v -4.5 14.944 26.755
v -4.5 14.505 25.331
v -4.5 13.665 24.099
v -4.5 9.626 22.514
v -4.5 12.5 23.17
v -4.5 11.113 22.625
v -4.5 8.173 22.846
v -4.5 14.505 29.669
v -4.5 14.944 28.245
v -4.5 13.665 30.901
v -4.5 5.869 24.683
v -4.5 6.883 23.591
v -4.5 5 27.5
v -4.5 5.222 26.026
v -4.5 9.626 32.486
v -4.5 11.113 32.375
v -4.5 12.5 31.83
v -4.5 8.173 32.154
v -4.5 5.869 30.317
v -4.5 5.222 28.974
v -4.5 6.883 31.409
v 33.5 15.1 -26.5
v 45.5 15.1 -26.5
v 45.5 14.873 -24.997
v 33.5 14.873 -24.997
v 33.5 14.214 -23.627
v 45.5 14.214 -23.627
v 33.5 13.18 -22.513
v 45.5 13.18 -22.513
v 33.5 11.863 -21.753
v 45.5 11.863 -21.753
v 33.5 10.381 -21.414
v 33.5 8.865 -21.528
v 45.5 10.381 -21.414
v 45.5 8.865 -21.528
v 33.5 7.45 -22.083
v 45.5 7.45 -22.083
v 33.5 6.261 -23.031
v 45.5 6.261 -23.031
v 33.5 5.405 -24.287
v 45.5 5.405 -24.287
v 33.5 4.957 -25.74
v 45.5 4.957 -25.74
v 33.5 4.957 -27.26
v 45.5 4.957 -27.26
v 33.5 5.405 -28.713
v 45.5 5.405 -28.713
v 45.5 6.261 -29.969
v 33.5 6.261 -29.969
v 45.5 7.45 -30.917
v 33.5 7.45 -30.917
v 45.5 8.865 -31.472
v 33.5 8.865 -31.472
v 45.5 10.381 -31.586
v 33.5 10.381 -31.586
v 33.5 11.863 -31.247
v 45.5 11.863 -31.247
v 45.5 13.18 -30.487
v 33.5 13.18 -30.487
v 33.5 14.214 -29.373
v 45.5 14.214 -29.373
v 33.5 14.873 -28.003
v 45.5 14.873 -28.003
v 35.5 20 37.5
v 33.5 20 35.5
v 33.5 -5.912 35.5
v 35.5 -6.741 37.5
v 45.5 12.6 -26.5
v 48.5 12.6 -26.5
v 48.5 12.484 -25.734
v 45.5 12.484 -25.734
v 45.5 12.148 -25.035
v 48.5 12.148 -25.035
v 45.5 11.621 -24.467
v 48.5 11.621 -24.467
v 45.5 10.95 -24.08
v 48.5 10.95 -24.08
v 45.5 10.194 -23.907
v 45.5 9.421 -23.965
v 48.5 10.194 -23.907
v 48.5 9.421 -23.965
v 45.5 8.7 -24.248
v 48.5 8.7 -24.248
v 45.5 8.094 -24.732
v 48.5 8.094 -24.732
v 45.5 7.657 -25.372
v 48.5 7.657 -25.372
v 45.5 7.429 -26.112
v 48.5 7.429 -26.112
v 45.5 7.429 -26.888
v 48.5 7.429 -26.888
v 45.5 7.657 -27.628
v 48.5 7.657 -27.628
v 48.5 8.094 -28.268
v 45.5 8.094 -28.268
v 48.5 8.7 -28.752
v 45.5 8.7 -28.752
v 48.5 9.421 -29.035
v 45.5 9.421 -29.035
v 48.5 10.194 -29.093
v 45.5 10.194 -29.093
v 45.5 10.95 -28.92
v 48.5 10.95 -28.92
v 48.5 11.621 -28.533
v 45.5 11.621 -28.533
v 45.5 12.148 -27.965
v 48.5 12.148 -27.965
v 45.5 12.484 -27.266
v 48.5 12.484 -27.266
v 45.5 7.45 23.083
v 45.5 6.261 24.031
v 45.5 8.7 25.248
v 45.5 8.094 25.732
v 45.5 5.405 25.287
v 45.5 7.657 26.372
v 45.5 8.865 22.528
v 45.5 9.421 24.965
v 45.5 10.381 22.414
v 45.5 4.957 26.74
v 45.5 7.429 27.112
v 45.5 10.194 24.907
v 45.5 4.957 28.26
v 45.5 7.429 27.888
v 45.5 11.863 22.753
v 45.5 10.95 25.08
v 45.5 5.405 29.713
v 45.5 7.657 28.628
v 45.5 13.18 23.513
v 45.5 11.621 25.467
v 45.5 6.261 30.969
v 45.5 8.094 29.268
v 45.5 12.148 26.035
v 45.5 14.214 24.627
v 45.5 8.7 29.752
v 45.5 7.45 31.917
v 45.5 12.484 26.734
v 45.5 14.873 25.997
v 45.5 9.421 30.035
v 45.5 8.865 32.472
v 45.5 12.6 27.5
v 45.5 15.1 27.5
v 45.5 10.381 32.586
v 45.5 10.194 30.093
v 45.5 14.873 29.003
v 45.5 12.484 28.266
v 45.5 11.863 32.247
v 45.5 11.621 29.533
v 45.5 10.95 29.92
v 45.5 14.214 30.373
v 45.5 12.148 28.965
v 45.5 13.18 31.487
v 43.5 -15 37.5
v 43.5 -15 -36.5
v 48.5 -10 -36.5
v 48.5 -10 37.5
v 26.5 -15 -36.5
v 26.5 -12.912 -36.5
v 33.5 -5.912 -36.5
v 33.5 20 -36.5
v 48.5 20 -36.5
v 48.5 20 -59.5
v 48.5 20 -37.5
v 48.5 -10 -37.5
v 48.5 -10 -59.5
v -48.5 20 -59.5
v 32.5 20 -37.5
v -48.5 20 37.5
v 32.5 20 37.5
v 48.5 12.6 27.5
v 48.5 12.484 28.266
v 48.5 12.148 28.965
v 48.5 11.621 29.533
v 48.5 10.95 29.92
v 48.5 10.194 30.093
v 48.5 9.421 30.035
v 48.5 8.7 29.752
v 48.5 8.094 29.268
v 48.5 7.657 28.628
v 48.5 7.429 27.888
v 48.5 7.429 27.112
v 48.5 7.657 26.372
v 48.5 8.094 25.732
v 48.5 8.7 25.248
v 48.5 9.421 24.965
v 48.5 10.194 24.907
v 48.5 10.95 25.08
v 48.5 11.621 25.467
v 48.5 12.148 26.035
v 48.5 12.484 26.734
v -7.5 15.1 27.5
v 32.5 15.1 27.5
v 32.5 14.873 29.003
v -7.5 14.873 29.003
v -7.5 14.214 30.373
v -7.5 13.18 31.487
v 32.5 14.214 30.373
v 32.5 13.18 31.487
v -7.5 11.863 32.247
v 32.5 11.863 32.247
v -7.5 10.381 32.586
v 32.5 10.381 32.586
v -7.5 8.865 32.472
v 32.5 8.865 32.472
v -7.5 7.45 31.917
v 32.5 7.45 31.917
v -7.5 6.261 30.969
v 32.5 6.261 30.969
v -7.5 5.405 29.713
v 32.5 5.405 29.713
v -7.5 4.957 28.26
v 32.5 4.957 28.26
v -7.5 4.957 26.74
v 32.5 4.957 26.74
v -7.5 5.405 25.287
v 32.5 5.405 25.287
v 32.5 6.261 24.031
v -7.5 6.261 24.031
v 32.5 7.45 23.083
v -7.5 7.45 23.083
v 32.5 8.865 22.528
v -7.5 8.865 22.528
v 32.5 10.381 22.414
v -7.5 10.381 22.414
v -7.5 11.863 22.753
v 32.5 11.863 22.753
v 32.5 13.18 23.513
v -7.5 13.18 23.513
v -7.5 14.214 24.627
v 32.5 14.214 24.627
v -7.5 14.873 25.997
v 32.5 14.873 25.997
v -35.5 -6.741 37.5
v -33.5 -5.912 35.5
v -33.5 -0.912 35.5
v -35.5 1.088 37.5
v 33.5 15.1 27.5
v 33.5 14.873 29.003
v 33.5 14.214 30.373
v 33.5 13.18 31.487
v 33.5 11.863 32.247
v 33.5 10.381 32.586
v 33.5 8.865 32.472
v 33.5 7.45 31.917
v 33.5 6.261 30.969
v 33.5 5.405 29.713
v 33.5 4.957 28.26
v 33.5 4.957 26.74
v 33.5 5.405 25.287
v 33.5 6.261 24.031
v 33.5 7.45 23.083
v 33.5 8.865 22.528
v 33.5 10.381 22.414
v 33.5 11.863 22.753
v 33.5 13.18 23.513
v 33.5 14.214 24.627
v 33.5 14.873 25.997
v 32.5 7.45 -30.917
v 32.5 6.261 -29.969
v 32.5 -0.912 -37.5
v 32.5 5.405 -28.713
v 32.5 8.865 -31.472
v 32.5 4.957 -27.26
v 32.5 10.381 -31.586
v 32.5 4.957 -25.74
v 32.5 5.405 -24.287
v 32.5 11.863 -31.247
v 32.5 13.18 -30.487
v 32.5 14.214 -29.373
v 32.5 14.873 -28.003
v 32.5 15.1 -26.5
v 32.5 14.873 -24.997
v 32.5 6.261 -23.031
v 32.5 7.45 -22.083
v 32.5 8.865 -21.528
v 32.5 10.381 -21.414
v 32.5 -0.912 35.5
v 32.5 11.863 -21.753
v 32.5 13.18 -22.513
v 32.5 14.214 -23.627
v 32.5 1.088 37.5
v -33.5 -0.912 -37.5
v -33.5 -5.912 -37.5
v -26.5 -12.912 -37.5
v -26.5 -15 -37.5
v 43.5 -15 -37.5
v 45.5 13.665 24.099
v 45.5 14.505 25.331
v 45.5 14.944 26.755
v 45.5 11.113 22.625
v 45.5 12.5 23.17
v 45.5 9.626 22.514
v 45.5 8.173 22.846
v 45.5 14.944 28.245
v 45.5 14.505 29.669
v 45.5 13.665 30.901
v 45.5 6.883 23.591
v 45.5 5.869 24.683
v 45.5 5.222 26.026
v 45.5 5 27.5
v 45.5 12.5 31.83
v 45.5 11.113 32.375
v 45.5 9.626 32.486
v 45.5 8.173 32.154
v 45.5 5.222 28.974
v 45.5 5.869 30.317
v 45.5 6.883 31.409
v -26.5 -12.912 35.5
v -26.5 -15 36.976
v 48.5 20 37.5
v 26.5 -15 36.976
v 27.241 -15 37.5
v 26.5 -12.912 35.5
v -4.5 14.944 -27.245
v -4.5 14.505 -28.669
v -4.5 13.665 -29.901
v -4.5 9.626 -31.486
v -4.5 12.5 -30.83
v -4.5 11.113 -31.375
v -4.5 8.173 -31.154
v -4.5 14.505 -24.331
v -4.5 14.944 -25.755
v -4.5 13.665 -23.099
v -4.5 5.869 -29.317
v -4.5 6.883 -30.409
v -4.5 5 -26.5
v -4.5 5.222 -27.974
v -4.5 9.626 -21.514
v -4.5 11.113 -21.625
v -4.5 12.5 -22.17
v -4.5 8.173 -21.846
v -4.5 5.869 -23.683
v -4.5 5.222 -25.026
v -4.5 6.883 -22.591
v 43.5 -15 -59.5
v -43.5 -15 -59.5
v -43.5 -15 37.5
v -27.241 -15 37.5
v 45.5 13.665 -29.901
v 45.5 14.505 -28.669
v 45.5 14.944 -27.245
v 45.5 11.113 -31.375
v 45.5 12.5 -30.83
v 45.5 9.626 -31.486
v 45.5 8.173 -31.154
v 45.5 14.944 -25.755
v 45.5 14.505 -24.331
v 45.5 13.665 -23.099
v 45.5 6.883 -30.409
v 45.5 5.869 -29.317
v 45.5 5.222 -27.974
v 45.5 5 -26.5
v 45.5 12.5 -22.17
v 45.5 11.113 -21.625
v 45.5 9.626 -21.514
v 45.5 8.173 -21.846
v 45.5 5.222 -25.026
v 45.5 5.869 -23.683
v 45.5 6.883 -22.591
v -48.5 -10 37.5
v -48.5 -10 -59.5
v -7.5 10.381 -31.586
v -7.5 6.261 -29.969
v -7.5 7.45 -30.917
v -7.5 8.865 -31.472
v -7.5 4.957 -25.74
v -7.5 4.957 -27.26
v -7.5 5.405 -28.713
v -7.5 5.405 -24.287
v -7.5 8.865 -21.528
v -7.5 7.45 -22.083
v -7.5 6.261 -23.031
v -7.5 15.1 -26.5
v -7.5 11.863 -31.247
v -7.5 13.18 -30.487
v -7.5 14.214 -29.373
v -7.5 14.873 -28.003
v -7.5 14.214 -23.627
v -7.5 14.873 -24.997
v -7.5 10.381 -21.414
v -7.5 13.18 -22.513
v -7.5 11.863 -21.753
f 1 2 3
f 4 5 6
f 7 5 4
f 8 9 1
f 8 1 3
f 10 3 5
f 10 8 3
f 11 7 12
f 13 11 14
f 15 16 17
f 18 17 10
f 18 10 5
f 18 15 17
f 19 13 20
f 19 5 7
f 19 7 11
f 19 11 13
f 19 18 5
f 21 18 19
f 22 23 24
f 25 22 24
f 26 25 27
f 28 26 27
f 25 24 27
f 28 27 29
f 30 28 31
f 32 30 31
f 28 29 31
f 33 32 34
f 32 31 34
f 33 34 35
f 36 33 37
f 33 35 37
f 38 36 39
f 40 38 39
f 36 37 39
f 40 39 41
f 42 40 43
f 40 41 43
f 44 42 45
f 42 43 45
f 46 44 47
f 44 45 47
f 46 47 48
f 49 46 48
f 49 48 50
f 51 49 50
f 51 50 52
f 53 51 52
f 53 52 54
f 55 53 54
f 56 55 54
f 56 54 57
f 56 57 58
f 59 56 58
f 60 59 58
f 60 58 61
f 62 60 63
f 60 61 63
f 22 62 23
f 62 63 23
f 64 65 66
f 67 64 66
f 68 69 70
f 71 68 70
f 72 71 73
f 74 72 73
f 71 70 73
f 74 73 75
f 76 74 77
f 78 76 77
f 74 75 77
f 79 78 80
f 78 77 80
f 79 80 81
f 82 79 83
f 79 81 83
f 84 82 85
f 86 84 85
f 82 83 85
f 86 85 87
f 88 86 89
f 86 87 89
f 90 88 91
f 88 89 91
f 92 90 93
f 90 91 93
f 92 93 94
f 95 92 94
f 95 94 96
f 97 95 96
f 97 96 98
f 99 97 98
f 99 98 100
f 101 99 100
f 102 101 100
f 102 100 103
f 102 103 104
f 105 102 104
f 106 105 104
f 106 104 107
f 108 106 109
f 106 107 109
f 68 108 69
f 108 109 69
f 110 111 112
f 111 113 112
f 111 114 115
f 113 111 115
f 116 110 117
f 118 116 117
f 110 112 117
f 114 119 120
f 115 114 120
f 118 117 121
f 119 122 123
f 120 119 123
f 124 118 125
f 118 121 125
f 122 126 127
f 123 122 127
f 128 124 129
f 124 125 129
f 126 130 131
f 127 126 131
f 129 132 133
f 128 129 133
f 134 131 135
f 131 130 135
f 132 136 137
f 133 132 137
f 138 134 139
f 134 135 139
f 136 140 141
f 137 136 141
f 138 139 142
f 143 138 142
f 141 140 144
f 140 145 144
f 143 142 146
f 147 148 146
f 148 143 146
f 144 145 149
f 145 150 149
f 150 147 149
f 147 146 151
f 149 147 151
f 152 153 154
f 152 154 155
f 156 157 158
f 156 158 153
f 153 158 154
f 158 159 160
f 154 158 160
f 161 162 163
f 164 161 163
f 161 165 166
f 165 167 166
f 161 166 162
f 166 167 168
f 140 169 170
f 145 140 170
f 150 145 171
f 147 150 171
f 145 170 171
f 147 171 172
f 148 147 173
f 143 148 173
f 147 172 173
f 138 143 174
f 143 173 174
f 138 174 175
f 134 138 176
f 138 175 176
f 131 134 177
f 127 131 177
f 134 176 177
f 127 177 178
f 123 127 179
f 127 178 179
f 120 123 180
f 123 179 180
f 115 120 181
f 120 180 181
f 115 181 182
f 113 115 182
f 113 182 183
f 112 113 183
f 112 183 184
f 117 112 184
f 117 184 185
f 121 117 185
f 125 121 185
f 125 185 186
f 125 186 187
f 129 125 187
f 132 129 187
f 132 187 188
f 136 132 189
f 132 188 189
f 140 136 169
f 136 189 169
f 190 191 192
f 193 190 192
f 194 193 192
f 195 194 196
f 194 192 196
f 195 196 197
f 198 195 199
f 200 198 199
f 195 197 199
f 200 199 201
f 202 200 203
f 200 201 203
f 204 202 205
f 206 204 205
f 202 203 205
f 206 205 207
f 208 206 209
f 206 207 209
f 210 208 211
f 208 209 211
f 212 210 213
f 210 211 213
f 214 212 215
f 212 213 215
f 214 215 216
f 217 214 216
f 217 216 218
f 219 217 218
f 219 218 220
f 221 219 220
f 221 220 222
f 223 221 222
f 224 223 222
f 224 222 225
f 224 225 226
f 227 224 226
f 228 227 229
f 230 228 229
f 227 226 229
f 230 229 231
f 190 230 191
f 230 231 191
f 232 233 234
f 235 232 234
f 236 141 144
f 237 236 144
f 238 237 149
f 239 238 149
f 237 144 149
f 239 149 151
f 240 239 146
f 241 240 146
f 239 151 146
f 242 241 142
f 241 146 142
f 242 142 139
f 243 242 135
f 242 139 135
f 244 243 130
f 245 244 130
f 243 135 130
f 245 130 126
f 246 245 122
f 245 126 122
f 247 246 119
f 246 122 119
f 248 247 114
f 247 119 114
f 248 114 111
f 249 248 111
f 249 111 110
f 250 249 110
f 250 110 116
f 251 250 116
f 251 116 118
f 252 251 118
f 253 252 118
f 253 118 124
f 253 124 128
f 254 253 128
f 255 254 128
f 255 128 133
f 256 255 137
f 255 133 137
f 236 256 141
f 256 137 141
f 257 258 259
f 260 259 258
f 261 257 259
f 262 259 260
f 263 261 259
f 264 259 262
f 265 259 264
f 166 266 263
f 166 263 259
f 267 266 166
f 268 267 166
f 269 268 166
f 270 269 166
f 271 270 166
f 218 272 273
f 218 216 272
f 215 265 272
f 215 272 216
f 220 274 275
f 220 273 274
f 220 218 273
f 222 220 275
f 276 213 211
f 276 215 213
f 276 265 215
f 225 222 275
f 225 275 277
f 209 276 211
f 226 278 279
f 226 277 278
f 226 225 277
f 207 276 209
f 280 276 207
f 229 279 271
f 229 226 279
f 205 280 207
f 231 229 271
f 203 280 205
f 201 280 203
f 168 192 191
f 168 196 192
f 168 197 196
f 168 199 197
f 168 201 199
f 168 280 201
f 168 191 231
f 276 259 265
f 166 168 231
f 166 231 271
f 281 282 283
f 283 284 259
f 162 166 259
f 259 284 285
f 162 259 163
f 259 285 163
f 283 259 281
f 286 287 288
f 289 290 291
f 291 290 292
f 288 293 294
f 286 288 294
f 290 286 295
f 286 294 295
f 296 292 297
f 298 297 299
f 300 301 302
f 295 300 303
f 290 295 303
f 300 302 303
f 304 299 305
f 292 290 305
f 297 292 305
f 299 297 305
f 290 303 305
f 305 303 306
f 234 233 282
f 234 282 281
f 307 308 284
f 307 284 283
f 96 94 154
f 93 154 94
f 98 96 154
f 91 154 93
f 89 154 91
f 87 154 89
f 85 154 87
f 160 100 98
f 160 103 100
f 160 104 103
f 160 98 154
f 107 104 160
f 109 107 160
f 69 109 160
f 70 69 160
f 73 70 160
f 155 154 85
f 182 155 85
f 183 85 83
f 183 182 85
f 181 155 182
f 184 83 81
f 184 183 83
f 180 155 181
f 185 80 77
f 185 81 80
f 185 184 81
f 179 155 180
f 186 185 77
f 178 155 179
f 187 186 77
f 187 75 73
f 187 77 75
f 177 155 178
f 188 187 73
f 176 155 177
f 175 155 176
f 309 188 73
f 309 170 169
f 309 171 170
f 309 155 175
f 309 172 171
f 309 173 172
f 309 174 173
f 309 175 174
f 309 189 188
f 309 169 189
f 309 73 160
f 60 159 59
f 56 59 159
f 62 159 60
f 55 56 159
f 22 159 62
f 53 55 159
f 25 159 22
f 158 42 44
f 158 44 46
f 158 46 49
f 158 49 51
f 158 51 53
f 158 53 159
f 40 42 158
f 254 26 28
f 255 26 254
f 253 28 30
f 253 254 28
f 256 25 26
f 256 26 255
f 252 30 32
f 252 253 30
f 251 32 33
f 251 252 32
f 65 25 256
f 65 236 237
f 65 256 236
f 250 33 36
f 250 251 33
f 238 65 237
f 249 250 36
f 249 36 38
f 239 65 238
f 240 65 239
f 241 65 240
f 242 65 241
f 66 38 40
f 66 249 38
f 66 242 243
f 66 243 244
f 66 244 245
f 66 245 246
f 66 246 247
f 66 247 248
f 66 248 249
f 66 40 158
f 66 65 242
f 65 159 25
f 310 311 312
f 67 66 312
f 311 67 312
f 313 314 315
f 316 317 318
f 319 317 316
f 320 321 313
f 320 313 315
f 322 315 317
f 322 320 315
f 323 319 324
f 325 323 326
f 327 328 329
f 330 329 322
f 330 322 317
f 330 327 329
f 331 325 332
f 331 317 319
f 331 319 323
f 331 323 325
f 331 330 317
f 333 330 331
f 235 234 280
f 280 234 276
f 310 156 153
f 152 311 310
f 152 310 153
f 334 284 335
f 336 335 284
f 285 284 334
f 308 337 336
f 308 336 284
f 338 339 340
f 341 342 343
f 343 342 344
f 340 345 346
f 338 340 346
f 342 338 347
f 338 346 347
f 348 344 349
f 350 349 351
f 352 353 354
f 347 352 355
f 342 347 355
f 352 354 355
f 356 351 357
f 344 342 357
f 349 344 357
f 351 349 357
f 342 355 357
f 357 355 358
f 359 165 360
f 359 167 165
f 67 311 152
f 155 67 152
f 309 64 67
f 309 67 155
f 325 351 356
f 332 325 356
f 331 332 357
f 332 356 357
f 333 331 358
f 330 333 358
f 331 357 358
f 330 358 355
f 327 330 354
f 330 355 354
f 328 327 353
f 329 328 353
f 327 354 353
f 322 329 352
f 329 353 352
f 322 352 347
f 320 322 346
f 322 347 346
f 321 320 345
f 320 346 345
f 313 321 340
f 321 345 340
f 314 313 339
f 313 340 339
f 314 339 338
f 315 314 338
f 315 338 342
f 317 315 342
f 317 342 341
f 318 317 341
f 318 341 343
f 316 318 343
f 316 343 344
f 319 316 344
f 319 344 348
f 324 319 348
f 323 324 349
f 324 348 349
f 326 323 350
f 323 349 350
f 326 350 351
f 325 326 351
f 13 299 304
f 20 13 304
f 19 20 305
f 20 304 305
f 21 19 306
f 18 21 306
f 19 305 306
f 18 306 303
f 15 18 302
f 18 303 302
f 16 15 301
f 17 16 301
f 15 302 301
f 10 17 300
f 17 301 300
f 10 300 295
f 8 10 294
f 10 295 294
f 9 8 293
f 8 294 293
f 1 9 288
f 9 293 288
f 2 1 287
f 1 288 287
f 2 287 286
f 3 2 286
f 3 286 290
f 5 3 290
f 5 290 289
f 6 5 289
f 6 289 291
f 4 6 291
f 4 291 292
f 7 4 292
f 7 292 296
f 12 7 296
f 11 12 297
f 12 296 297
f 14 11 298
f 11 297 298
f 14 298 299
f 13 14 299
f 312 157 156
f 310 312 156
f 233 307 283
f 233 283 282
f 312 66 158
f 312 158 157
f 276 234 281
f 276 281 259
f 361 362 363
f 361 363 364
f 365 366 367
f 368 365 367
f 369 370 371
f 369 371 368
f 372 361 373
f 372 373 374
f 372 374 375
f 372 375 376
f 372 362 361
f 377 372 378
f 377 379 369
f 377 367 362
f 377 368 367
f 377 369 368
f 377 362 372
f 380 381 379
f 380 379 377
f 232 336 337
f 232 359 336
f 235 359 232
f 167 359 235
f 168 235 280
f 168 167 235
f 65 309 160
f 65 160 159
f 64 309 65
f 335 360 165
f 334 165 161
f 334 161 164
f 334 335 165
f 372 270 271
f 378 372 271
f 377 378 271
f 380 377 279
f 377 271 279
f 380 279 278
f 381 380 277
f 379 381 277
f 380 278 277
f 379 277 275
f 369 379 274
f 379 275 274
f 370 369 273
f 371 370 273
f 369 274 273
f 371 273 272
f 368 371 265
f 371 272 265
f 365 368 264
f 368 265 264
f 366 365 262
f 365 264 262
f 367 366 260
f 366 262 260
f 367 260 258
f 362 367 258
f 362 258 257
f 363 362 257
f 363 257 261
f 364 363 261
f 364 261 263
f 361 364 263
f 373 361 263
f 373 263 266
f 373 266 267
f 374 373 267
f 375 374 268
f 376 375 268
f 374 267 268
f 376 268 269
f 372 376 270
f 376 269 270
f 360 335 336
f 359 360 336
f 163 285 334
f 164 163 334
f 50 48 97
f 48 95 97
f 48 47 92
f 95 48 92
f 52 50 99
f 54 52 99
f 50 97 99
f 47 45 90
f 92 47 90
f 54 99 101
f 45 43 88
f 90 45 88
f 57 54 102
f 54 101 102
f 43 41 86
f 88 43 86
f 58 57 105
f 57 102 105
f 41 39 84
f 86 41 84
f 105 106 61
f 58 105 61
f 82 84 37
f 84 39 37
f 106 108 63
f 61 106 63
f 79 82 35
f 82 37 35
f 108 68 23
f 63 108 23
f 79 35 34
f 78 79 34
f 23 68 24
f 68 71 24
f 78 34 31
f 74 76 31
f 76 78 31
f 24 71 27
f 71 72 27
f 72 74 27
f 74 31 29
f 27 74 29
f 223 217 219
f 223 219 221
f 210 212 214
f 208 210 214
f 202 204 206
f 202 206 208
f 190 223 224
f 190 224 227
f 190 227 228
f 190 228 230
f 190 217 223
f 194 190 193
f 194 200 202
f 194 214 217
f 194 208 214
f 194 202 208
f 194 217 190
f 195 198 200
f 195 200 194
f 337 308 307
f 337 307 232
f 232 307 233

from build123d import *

# Parameters (mm, degrees)
F1_DEPTH      = 37.5
F2_DEPTH      = 37.5
F2_DEPTH_BACK = 36.5
F3_W          = 97
F3_H          = 35
F4_DEPTH      = 22
F5_SIZE       = 5
F5_2_SIZE     = 5
F7_START      = -3
F6_R          = 5.1
F7_DEPTH      = 12
F8_R          = 2.6
F9_DEPTH      = 3
F10_R         = 5.1
F11_DEPTH     = 40
F12_R         = 5
F13_DEPTH     = 50
F14_SIZE      = 2
F14_2_SIZE    = 2


# Not quite as in the source:
# - a feature names something its author has since deleted; it is built from what else it names


with BuildPart() as f1:
    # F0 (on Top) → F1 (new body, symmetric)
    with BuildSketch(Plane.XY):
        Polygon((-26.5, -15), (-26.5, -12.9124395503), (-33.5, -5.9124395503), (-33.5, -0.9124395503), (32.5, -0.9124395503), (32.5, 20), (-48.5, 20), (-48.5, -15), align=None)
    extrude(amount=F1_DEPTH, both=True)

    # F3 (on face) → F4 (join)
    with BuildSketch(Plane(origin=(0, 0, -37.5), x_dir=(1, 0, 0), z_dir=(0, 0, -1))):
        with Locations((0, -2.5)):
            Rectangle(F3_W, F3_H)
    extrude(amount=F4_DEPTH)

    # F5
    f5_edges = [f1.edges().sort_by_distance(p)[0] for p in [
        (-48.5, -15, -11),
        (48.5, -15, -48.5),
    ]]
    chamfer(f5_edges, length=F5_SIZE)

    # F10 (on face) → F11 (cut)
    with BuildSketch(Plane.YZ.offset(32.5)):
        with Locations((10, 27.5)):
            Circle(F10_R)
        with Locations((10, -26.5)):
            Circle(F10_R)
    extrude(amount=-F11_DEPTH, mode=Mode.SUBTRACT)

    # F14
    f14_edges = [f1.edges().sort_by_distance(p)[0] for p in [
        (-0.5, -0.91244, 37.5),
        (-33.5, -3.41244, 37.5),
        (-30, -9.41244, 37.5),
    ]]
    chamfer(f14_edges, length=F14_SIZE)


with BuildPart() as f2:
    # F0 (on Top) → F2 (new body, two sides)
    with BuildSketch(Plane.XY) as f2_sk:
        Polygon((26.5, -12.9124395503), (26.5, -15), (48.5, -15), (48.5, 20), (33.5, 20), (33.5, -5.9124395503), align=None)
    extrude(amount=F2_DEPTH)
    extrude(f2_sk.sketch, amount=-F2_DEPTH_BACK)

    # F5#2
    f5_2_edges = [f2.edges().sort_by_distance(p)[0] for p in [
        (48.5, -15, 0.5),
    ]]
    chamfer(f5_2_edges, length=F5_2_SIZE)

    # F6 (on face) → F7 (cut)
    with BuildSketch(Plane.YZ.offset(48.5).offset(F7_START)):
        with Locations((10, 27.5)):
            Circle(F6_R)
        with Locations((10, -26.5)):
            Circle(F6_R)
    extrude(amount=-F7_DEPTH, mode=Mode.SUBTRACT)

    # F8 (on face) → F9 (cut)
    with BuildSketch(Plane.YZ.offset(48.5)):
        with Locations((10, 27.5)):
            Circle(F8_R)
        with Locations((10, -26.5)):
            Circle(F8_R)
    extrude(amount=-F9_DEPTH, mode=Mode.SUBTRACT)

    # F14#2
    f14_2_edges = [f2.edges().sort_by_distance(p)[0] for p in [
        (30, -9.41244, 37.5),
        (33.5, 7.04378, 37.5),
    ]]
    chamfer(f14_2_edges, length=F14_2_SIZE)


with BuildPart() as f13:
    # F12 (on face) → F13 (new body)
    with BuildSketch(Plane(origin=(45.5, 0, 0), x_dir=(0, -1, 0), z_dir=(-1, 0, 0))):
        with Locations((-10, 27.5)):
            Circle(F12_R)
    extrude(amount=F13_DEPTH)


with BuildPart() as f13b:
    # F12 (on face) → F13, piece 2 (new body)
    with BuildSketch(Plane(origin=(45.5, 0, 0), x_dir=(0, -1, 0), z_dir=(-1, 0, 0))):
        with Locations((-10, -26.5)):
            Circle(F12_R)
    extrude(amount=F13_DEPTH)


solid = Compound([f1.part, f2.part, f13.part, f13b.part])
